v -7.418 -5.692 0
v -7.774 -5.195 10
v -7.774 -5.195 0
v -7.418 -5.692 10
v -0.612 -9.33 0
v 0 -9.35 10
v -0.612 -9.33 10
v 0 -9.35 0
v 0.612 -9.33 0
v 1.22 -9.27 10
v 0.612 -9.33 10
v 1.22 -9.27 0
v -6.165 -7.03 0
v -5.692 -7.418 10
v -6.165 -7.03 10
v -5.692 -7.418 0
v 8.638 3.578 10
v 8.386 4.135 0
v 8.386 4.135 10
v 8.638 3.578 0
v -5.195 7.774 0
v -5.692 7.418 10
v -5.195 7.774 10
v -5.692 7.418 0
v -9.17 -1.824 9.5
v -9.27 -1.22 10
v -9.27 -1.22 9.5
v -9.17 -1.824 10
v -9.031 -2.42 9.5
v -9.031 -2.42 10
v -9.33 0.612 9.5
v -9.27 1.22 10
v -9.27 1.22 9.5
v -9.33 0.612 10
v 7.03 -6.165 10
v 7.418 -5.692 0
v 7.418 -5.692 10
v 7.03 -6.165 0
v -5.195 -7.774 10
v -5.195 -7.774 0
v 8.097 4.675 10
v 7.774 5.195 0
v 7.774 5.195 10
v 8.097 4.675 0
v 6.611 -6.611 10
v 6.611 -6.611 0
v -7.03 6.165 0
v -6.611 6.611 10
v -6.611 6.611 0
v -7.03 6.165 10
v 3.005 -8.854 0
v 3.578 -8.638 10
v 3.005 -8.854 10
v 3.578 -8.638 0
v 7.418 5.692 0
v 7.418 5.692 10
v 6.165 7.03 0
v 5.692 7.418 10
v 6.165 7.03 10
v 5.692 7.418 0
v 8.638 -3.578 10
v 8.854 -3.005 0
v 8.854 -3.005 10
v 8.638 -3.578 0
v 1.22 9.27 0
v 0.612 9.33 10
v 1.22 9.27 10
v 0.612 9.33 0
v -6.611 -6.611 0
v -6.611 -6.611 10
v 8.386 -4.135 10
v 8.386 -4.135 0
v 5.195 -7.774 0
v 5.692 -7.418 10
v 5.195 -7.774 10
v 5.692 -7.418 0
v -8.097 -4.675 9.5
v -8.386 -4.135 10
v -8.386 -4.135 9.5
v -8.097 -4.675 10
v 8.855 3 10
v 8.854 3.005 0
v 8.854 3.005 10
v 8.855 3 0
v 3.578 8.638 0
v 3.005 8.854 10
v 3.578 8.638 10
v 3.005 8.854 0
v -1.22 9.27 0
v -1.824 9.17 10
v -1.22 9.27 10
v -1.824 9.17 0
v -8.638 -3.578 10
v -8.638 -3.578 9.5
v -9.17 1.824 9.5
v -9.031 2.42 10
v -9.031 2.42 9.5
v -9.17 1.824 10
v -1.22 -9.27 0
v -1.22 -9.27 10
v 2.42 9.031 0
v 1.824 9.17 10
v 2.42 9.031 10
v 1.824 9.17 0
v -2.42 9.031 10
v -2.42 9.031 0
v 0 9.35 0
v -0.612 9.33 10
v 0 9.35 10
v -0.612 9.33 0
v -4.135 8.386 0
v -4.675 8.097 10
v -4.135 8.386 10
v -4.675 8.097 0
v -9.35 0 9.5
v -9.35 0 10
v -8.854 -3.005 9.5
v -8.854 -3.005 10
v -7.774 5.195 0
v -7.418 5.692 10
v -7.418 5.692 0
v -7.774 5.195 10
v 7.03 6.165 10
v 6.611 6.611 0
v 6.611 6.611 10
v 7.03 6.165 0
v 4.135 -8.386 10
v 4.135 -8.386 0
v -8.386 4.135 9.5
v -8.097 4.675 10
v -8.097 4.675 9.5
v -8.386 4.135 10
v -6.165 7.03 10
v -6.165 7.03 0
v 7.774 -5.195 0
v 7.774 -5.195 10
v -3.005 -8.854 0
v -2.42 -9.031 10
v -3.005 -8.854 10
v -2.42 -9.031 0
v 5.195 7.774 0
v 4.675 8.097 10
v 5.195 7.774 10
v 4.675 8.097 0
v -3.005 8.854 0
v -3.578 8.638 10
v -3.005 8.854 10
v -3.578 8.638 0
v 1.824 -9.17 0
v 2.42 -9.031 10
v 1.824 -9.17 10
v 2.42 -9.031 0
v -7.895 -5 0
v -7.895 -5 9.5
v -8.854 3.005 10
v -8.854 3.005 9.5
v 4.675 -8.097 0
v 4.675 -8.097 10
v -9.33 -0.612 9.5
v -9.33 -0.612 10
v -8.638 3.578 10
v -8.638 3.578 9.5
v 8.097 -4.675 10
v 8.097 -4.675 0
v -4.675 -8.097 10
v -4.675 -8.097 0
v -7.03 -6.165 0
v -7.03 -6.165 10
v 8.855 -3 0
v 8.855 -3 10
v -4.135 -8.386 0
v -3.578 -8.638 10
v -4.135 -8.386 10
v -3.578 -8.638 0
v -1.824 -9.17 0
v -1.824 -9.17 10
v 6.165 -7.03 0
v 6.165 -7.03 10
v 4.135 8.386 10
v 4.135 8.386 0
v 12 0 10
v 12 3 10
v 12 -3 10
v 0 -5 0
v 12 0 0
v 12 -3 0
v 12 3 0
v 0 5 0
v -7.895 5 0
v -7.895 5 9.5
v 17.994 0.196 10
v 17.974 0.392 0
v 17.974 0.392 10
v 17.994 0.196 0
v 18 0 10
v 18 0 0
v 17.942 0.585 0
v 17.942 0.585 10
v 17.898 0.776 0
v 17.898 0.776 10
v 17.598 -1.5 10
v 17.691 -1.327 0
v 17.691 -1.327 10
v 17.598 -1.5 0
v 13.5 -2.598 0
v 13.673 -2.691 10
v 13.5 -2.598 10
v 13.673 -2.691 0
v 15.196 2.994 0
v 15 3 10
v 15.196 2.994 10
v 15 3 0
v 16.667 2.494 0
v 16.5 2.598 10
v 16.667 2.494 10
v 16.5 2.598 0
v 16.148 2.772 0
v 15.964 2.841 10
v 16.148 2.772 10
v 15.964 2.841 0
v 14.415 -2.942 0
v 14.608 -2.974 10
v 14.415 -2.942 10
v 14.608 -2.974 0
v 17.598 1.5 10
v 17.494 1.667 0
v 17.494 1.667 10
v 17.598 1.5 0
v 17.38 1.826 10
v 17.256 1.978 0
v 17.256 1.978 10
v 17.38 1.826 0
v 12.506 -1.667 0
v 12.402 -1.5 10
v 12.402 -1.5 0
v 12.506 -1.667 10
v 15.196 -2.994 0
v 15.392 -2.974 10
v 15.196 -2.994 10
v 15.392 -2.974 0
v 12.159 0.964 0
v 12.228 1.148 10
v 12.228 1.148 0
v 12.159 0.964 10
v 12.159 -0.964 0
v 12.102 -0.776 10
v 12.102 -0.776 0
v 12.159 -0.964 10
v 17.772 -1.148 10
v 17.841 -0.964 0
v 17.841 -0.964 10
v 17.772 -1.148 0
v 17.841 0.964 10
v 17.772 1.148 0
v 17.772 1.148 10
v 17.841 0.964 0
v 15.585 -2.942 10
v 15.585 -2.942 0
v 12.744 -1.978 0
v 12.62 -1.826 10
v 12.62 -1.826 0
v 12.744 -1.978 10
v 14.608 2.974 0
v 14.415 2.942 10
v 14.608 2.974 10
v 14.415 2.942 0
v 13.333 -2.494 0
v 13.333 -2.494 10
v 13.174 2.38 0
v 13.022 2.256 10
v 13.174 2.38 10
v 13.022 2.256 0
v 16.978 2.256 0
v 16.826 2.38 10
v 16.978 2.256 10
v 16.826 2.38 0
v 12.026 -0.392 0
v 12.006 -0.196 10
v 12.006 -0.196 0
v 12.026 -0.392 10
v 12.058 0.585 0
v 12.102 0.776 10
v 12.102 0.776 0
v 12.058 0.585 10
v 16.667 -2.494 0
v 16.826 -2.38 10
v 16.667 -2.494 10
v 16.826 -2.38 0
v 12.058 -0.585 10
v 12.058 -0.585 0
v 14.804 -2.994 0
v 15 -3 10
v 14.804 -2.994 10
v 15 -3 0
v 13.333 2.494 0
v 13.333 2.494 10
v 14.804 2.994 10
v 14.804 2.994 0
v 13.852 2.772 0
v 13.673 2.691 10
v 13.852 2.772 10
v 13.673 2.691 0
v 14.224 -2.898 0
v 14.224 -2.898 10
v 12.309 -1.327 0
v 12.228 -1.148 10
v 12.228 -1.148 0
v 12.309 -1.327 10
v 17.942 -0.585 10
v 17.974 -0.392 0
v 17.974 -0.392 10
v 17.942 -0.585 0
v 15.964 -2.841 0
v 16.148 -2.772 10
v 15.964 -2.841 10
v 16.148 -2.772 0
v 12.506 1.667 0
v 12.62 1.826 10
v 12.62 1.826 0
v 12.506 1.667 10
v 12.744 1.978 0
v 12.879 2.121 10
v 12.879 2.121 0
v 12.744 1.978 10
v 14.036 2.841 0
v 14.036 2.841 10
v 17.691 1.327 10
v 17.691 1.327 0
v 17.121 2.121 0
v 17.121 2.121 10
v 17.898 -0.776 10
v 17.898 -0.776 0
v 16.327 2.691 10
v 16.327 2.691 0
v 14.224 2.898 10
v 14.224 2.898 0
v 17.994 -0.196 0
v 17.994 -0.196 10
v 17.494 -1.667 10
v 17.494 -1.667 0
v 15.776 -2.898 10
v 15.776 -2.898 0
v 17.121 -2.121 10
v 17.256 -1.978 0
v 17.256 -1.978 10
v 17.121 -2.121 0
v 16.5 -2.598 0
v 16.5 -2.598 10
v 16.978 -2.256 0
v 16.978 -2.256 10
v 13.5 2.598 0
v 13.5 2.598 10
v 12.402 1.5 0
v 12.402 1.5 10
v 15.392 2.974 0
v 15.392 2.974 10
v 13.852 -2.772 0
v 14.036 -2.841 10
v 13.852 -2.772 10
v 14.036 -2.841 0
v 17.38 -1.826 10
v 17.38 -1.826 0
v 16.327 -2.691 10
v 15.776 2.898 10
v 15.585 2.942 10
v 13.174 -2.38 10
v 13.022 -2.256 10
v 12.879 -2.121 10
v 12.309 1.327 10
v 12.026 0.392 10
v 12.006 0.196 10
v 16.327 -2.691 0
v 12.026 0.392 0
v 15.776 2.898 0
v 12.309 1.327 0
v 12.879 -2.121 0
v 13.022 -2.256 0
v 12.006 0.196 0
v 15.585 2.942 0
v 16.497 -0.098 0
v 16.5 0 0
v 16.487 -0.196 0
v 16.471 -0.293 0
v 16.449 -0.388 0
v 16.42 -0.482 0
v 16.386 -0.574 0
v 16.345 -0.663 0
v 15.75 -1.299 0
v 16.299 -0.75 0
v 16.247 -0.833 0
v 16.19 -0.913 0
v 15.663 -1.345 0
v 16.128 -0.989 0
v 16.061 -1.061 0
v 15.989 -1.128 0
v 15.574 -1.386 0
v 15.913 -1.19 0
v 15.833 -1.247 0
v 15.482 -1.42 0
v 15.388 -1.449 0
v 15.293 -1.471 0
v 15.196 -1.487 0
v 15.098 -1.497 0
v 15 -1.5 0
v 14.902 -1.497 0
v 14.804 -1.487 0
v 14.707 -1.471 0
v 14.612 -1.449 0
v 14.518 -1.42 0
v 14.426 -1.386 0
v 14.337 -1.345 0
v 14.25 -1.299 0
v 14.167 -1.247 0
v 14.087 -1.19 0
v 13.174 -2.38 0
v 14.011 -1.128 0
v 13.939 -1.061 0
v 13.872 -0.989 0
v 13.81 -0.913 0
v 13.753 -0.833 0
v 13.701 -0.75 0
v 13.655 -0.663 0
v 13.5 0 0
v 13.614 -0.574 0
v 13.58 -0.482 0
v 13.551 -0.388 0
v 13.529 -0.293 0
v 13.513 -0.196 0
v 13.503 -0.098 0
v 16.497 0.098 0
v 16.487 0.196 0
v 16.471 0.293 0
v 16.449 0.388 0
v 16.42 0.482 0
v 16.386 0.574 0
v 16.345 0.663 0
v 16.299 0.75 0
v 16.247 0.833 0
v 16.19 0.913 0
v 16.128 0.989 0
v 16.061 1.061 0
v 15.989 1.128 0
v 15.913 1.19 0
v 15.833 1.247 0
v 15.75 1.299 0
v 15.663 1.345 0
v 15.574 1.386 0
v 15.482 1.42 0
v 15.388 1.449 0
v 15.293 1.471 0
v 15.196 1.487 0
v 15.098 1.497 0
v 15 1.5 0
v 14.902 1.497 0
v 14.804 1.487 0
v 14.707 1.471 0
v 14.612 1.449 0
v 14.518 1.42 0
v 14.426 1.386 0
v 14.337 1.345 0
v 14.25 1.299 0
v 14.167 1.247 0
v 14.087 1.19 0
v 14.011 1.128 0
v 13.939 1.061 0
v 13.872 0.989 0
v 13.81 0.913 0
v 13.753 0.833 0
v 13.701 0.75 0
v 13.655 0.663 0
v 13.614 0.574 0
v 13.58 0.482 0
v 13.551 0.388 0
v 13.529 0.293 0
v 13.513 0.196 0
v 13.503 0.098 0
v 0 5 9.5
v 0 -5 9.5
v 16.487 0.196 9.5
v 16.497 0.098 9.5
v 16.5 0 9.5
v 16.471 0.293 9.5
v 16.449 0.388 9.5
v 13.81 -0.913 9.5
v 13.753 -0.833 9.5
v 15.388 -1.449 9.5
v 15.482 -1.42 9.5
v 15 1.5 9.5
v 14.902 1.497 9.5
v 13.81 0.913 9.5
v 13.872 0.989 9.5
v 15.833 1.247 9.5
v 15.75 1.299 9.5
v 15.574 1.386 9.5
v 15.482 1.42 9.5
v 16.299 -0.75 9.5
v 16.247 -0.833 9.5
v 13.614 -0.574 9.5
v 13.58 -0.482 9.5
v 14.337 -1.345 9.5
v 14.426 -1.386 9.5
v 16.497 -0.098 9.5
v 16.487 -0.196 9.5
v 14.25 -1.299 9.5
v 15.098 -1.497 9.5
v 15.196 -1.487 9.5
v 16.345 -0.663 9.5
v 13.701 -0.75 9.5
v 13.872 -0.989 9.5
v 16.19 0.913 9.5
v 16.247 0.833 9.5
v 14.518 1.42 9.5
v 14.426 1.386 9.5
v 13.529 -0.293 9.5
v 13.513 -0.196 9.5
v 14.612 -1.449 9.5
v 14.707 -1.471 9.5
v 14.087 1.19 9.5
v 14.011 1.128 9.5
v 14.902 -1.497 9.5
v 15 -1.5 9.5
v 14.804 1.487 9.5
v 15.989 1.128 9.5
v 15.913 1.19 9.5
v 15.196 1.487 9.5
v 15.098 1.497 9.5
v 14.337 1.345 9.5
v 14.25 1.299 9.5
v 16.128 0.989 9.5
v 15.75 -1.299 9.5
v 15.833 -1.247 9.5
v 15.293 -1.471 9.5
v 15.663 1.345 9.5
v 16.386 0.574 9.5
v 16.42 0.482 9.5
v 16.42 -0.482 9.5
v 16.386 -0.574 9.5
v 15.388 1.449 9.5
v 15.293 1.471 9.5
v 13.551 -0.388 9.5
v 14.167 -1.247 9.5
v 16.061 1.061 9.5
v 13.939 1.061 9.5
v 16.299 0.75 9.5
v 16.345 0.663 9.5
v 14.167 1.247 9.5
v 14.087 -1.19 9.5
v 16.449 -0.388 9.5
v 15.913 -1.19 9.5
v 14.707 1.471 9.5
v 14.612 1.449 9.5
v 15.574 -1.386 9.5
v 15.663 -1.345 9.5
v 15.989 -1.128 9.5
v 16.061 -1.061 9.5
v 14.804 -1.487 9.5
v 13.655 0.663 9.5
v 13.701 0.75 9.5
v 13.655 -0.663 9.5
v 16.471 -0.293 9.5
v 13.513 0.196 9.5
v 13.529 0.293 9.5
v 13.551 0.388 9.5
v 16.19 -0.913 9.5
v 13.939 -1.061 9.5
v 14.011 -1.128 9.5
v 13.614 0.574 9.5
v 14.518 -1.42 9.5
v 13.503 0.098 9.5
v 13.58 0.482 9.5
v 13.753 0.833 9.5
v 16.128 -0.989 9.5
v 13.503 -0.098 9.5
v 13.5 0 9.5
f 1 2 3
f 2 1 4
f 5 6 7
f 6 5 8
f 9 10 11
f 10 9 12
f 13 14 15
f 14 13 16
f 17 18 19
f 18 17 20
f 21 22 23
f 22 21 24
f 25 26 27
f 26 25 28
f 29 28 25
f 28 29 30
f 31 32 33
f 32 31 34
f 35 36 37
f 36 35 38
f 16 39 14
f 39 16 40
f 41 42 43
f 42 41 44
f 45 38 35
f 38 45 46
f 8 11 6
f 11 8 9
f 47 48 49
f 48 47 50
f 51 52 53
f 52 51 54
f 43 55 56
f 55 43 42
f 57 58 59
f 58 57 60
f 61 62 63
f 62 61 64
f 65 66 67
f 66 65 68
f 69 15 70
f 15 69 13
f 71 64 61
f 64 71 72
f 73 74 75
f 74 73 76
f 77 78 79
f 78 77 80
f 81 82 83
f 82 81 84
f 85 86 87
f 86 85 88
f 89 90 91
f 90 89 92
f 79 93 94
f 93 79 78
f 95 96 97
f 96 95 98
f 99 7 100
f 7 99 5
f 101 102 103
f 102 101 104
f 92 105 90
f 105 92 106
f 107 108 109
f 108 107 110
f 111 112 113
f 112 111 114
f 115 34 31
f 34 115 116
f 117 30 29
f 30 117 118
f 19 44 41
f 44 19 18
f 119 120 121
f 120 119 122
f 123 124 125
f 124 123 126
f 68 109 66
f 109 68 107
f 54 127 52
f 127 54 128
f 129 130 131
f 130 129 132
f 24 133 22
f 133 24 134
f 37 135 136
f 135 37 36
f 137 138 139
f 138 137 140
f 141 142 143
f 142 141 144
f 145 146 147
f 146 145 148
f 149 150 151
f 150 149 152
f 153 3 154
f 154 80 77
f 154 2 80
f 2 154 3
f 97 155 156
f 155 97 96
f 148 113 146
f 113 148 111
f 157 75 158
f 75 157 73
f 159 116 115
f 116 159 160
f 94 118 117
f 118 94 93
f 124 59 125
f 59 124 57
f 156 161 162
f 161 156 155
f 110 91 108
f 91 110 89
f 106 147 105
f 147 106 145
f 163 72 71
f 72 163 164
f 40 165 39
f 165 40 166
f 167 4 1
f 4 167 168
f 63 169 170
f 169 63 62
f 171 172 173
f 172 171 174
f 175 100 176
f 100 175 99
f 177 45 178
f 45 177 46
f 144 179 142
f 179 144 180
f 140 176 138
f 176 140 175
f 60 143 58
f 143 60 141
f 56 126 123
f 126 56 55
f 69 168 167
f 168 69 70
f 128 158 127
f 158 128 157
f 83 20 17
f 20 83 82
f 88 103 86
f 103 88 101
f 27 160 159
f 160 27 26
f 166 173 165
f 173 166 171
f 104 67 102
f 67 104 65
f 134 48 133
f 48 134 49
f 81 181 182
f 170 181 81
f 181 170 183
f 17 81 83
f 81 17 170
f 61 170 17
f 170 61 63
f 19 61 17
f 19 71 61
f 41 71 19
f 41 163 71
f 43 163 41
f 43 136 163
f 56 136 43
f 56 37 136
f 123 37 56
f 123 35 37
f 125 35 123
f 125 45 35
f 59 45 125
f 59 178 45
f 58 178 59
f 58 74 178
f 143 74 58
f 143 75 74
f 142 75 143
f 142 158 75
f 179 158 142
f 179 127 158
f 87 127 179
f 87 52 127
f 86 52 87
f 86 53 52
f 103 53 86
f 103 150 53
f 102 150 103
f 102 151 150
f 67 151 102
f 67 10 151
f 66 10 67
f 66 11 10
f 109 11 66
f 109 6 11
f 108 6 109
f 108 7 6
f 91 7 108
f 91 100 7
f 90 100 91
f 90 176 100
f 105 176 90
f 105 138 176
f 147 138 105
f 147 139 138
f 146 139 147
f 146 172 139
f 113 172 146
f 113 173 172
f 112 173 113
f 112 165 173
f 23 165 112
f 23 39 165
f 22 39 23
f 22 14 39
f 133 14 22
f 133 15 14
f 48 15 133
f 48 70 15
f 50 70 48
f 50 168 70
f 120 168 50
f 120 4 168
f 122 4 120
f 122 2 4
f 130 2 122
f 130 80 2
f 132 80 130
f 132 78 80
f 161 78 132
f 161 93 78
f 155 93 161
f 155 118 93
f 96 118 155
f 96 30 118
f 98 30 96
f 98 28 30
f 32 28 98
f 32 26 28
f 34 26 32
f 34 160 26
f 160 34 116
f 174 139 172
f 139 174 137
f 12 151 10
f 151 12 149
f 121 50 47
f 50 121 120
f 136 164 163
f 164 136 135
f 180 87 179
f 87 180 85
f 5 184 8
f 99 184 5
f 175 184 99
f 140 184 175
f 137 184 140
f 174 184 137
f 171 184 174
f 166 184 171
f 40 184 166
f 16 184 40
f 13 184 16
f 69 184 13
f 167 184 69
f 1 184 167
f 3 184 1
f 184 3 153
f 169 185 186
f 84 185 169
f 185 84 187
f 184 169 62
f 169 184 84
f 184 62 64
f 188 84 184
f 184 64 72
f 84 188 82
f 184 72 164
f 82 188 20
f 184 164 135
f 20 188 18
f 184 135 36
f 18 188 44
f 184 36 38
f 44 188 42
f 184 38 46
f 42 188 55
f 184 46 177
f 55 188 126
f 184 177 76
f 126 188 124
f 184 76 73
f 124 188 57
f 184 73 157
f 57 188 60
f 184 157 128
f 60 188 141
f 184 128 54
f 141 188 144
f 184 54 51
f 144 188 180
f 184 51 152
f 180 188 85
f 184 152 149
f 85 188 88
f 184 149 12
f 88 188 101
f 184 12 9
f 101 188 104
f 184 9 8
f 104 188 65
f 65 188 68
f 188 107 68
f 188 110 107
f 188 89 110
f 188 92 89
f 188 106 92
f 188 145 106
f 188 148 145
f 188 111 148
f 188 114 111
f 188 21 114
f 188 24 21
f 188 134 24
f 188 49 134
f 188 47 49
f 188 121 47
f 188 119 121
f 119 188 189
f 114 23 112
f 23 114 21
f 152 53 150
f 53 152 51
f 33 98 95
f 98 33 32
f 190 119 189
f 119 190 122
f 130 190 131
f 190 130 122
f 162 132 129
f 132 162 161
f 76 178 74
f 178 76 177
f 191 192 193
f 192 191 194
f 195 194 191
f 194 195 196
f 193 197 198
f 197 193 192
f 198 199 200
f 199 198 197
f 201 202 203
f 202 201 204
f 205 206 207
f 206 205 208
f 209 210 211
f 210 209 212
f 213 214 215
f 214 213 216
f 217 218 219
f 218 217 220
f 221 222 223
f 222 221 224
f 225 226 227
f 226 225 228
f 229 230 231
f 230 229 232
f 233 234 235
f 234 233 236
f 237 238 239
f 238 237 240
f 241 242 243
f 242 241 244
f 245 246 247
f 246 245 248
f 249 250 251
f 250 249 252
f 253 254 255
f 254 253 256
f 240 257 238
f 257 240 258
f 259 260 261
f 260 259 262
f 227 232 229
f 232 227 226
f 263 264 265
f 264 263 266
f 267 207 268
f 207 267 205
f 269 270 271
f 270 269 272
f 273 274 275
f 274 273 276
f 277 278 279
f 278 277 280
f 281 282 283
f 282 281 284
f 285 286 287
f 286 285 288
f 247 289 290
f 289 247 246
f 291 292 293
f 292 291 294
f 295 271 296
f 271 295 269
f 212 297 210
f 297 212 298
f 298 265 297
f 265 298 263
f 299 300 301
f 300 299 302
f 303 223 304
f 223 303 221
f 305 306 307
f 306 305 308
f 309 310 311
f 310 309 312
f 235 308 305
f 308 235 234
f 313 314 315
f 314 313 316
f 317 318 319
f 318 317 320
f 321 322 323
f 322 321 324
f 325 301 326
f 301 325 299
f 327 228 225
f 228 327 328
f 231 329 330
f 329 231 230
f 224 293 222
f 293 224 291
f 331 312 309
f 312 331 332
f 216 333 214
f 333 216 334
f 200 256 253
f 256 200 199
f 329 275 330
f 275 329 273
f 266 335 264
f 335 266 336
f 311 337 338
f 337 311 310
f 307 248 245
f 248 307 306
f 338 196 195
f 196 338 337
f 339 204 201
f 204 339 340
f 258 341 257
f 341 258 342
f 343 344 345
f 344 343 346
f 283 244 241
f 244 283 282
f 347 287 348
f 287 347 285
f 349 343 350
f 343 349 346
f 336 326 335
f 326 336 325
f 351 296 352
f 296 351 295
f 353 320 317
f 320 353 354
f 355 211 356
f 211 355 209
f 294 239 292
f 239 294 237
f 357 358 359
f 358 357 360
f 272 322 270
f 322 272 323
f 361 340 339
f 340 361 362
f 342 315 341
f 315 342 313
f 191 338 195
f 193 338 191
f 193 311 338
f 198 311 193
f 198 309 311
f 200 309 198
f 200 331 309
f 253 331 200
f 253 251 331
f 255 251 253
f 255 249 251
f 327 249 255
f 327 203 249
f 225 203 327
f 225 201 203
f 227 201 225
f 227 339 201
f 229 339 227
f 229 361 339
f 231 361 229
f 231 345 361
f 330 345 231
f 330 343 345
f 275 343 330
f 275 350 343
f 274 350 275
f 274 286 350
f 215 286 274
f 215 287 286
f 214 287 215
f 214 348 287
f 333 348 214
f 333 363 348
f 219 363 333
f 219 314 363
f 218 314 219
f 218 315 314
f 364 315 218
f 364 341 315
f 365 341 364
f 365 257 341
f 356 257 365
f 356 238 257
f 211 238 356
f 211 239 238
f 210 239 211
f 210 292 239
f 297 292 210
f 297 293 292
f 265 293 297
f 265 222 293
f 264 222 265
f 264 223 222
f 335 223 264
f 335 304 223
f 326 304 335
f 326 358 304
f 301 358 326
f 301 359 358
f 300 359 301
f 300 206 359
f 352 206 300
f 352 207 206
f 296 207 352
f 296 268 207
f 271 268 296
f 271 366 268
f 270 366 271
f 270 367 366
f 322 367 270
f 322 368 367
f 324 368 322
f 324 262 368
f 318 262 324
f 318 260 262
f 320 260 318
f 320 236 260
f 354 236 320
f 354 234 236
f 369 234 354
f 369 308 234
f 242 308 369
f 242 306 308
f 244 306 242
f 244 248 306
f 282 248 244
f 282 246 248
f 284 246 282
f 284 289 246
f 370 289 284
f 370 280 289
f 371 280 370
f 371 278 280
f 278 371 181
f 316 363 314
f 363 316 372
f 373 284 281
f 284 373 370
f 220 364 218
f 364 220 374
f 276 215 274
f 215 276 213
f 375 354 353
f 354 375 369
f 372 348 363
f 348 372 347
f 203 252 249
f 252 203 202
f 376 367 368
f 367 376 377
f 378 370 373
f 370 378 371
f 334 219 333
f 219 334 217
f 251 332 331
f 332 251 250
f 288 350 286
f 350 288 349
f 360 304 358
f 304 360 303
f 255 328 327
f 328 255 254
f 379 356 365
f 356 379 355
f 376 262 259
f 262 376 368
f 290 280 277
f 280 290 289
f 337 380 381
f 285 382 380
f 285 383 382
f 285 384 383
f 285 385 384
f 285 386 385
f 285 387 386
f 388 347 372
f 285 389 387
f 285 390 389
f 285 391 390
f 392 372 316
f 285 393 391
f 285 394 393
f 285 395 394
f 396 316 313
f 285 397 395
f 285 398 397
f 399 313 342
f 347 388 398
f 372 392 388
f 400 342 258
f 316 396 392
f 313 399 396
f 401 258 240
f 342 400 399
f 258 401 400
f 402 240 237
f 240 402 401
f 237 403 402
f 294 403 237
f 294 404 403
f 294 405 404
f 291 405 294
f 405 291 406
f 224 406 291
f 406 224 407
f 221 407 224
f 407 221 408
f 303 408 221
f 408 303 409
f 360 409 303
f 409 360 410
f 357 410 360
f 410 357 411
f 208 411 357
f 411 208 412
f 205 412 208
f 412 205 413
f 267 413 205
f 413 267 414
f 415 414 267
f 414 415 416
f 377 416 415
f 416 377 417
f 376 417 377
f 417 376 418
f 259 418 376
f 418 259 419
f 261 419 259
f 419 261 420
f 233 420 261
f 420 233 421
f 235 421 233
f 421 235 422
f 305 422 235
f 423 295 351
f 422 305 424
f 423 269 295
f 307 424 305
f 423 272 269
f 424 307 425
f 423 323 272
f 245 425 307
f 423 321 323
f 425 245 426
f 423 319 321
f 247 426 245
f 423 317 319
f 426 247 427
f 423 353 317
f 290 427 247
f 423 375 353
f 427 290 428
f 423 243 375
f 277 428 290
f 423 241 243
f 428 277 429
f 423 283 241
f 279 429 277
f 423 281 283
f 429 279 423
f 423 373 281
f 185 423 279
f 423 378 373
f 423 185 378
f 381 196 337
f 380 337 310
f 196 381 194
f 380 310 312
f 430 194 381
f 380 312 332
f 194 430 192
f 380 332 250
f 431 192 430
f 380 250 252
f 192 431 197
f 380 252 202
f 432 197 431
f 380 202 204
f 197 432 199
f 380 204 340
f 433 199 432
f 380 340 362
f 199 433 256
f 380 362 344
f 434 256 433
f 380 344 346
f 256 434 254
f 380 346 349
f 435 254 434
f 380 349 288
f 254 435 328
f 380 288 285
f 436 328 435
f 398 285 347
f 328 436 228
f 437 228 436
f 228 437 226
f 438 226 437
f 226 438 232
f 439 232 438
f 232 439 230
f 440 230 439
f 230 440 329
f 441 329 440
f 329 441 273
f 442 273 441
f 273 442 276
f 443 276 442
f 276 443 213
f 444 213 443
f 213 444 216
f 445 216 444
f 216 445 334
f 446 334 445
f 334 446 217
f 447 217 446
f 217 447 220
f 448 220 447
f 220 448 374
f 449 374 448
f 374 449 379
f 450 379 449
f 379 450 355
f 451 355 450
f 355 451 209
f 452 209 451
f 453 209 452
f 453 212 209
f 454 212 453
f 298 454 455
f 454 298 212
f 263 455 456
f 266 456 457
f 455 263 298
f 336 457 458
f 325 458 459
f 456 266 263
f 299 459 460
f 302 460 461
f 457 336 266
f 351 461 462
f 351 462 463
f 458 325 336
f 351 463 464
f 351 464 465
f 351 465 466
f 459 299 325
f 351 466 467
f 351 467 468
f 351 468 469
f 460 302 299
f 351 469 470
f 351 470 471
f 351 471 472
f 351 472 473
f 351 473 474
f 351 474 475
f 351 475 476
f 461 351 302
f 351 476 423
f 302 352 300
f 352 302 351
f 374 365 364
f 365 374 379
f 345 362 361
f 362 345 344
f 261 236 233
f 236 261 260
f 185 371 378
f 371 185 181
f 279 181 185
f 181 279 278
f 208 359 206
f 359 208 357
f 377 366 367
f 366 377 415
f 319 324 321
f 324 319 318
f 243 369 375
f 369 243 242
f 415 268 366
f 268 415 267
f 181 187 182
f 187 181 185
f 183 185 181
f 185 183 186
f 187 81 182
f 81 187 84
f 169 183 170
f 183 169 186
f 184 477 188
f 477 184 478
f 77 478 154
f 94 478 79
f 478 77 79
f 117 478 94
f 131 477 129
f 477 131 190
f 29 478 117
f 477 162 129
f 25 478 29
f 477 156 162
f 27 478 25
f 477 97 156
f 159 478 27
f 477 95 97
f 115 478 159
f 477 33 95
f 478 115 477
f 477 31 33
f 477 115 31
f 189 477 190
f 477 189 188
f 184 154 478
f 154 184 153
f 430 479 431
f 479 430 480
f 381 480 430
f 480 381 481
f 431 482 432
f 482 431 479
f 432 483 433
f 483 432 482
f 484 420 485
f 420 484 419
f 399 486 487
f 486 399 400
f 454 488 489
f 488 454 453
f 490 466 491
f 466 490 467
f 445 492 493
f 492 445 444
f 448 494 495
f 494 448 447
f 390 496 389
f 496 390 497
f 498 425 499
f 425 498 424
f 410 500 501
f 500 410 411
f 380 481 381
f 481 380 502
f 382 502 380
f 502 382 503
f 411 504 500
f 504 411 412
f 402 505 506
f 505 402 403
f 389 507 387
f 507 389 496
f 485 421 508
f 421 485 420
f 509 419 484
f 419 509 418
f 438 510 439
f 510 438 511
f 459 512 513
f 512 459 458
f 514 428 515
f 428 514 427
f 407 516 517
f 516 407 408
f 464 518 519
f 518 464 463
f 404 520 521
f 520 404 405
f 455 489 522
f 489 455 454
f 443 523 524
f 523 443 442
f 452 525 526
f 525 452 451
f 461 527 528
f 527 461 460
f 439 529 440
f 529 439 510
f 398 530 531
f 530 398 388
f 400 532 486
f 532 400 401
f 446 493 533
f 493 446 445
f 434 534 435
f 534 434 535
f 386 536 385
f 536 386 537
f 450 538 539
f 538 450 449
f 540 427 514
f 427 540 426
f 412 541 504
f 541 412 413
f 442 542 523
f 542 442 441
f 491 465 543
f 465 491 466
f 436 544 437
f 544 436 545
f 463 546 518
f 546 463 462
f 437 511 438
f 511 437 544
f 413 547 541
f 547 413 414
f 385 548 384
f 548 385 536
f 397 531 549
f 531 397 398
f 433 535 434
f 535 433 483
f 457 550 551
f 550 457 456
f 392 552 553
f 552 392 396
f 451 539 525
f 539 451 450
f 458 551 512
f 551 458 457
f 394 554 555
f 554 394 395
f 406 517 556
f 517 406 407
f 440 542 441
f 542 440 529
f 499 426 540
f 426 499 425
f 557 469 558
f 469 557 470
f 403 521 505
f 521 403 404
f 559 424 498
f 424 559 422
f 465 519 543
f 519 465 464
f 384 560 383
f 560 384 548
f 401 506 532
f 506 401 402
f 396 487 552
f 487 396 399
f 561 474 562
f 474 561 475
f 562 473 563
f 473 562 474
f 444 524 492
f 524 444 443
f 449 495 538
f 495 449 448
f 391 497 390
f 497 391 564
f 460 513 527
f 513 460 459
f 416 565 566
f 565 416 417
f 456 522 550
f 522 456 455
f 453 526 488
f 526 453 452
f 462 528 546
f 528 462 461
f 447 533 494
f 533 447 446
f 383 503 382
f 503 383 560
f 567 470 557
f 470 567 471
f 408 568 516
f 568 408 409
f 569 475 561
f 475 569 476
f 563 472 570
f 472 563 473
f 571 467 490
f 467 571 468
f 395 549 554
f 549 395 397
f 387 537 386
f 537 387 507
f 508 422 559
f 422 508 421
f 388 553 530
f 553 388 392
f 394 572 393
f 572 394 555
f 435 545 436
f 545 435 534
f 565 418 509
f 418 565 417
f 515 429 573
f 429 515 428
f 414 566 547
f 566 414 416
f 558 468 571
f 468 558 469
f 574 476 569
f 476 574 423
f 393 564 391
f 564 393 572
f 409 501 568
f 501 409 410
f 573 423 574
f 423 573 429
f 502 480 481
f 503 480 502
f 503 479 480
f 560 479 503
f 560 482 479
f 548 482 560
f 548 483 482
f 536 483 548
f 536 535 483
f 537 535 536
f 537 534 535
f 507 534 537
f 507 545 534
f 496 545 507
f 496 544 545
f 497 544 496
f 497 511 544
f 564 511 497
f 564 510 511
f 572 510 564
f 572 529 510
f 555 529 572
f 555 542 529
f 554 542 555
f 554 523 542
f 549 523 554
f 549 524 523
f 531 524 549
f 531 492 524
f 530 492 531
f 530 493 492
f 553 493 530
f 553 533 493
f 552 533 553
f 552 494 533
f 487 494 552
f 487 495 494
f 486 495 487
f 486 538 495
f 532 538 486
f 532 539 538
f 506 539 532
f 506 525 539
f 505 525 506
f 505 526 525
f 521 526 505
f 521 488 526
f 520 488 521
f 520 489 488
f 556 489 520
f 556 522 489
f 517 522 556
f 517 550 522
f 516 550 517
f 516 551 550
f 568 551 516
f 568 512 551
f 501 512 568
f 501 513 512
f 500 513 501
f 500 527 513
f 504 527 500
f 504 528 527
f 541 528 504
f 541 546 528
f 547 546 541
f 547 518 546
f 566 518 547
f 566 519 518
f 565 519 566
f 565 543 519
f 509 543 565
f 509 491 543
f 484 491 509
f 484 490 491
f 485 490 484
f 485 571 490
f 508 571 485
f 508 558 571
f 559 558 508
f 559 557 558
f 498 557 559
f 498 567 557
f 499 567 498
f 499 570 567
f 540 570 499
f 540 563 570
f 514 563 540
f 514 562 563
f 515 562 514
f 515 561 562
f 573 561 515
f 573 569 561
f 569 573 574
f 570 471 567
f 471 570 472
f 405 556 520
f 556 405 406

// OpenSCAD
// Tubing clip for 12.7 mm lab stand rod
// Print orientation: flat on bed, builds up in +Z

$fn = 96;

// ---- Dimensions (mm) ----
rod_d      = 12.7;   // stand rod diameter
ring_w     = 3;      // rod ring wall thickness
ring_od    = rod_d + 2*ring_w; // rod ring outer diameter (18.7)
ring_id    = rod_d;  // rod ring inner diameter

tub_d      = 6;      // tubing ring diameter (outer)
tub_wall   = 2;      // tubing ring wall thickness
tub_id     = tub_d - 2*tub_wall; // tubing ring inner diameter (2)

opening_x  = 10;     // rod ring opening width (along -X)
opening_y  = 5;      // rod ring opening half-height

bridge_x0  = 8;      // bridge start (X)
bridge_x1  = 12;     // bridge end (X)
bridge_w   = 6;      // bridge width (Y)

eps        = 0.5;    // cutter overshoot

// ---- Model ----
difference() {
    union() {
        // Rod ring
        cylinder(d = ring_od, h = 10);
        // Tubing ring
        translate([15, 0, 0])
            cylinder(d = tub_d, h = 10);
        // Solid bridge
        translate([bridge_x0, -bridge_w/2, 0])
            cube([bridge_x1 - bridge_x0, bridge_w, 10]);
    }
    // Rod ring opening
    translate([-opening_x, -opening_y, -eps])
        cube([opening_x, opening_y*2, 10]);
    // Tubing ring opening
    translate([15, 0, -eps])
        cylinder(d = tub_id + 2*eps, h = 10);
}
